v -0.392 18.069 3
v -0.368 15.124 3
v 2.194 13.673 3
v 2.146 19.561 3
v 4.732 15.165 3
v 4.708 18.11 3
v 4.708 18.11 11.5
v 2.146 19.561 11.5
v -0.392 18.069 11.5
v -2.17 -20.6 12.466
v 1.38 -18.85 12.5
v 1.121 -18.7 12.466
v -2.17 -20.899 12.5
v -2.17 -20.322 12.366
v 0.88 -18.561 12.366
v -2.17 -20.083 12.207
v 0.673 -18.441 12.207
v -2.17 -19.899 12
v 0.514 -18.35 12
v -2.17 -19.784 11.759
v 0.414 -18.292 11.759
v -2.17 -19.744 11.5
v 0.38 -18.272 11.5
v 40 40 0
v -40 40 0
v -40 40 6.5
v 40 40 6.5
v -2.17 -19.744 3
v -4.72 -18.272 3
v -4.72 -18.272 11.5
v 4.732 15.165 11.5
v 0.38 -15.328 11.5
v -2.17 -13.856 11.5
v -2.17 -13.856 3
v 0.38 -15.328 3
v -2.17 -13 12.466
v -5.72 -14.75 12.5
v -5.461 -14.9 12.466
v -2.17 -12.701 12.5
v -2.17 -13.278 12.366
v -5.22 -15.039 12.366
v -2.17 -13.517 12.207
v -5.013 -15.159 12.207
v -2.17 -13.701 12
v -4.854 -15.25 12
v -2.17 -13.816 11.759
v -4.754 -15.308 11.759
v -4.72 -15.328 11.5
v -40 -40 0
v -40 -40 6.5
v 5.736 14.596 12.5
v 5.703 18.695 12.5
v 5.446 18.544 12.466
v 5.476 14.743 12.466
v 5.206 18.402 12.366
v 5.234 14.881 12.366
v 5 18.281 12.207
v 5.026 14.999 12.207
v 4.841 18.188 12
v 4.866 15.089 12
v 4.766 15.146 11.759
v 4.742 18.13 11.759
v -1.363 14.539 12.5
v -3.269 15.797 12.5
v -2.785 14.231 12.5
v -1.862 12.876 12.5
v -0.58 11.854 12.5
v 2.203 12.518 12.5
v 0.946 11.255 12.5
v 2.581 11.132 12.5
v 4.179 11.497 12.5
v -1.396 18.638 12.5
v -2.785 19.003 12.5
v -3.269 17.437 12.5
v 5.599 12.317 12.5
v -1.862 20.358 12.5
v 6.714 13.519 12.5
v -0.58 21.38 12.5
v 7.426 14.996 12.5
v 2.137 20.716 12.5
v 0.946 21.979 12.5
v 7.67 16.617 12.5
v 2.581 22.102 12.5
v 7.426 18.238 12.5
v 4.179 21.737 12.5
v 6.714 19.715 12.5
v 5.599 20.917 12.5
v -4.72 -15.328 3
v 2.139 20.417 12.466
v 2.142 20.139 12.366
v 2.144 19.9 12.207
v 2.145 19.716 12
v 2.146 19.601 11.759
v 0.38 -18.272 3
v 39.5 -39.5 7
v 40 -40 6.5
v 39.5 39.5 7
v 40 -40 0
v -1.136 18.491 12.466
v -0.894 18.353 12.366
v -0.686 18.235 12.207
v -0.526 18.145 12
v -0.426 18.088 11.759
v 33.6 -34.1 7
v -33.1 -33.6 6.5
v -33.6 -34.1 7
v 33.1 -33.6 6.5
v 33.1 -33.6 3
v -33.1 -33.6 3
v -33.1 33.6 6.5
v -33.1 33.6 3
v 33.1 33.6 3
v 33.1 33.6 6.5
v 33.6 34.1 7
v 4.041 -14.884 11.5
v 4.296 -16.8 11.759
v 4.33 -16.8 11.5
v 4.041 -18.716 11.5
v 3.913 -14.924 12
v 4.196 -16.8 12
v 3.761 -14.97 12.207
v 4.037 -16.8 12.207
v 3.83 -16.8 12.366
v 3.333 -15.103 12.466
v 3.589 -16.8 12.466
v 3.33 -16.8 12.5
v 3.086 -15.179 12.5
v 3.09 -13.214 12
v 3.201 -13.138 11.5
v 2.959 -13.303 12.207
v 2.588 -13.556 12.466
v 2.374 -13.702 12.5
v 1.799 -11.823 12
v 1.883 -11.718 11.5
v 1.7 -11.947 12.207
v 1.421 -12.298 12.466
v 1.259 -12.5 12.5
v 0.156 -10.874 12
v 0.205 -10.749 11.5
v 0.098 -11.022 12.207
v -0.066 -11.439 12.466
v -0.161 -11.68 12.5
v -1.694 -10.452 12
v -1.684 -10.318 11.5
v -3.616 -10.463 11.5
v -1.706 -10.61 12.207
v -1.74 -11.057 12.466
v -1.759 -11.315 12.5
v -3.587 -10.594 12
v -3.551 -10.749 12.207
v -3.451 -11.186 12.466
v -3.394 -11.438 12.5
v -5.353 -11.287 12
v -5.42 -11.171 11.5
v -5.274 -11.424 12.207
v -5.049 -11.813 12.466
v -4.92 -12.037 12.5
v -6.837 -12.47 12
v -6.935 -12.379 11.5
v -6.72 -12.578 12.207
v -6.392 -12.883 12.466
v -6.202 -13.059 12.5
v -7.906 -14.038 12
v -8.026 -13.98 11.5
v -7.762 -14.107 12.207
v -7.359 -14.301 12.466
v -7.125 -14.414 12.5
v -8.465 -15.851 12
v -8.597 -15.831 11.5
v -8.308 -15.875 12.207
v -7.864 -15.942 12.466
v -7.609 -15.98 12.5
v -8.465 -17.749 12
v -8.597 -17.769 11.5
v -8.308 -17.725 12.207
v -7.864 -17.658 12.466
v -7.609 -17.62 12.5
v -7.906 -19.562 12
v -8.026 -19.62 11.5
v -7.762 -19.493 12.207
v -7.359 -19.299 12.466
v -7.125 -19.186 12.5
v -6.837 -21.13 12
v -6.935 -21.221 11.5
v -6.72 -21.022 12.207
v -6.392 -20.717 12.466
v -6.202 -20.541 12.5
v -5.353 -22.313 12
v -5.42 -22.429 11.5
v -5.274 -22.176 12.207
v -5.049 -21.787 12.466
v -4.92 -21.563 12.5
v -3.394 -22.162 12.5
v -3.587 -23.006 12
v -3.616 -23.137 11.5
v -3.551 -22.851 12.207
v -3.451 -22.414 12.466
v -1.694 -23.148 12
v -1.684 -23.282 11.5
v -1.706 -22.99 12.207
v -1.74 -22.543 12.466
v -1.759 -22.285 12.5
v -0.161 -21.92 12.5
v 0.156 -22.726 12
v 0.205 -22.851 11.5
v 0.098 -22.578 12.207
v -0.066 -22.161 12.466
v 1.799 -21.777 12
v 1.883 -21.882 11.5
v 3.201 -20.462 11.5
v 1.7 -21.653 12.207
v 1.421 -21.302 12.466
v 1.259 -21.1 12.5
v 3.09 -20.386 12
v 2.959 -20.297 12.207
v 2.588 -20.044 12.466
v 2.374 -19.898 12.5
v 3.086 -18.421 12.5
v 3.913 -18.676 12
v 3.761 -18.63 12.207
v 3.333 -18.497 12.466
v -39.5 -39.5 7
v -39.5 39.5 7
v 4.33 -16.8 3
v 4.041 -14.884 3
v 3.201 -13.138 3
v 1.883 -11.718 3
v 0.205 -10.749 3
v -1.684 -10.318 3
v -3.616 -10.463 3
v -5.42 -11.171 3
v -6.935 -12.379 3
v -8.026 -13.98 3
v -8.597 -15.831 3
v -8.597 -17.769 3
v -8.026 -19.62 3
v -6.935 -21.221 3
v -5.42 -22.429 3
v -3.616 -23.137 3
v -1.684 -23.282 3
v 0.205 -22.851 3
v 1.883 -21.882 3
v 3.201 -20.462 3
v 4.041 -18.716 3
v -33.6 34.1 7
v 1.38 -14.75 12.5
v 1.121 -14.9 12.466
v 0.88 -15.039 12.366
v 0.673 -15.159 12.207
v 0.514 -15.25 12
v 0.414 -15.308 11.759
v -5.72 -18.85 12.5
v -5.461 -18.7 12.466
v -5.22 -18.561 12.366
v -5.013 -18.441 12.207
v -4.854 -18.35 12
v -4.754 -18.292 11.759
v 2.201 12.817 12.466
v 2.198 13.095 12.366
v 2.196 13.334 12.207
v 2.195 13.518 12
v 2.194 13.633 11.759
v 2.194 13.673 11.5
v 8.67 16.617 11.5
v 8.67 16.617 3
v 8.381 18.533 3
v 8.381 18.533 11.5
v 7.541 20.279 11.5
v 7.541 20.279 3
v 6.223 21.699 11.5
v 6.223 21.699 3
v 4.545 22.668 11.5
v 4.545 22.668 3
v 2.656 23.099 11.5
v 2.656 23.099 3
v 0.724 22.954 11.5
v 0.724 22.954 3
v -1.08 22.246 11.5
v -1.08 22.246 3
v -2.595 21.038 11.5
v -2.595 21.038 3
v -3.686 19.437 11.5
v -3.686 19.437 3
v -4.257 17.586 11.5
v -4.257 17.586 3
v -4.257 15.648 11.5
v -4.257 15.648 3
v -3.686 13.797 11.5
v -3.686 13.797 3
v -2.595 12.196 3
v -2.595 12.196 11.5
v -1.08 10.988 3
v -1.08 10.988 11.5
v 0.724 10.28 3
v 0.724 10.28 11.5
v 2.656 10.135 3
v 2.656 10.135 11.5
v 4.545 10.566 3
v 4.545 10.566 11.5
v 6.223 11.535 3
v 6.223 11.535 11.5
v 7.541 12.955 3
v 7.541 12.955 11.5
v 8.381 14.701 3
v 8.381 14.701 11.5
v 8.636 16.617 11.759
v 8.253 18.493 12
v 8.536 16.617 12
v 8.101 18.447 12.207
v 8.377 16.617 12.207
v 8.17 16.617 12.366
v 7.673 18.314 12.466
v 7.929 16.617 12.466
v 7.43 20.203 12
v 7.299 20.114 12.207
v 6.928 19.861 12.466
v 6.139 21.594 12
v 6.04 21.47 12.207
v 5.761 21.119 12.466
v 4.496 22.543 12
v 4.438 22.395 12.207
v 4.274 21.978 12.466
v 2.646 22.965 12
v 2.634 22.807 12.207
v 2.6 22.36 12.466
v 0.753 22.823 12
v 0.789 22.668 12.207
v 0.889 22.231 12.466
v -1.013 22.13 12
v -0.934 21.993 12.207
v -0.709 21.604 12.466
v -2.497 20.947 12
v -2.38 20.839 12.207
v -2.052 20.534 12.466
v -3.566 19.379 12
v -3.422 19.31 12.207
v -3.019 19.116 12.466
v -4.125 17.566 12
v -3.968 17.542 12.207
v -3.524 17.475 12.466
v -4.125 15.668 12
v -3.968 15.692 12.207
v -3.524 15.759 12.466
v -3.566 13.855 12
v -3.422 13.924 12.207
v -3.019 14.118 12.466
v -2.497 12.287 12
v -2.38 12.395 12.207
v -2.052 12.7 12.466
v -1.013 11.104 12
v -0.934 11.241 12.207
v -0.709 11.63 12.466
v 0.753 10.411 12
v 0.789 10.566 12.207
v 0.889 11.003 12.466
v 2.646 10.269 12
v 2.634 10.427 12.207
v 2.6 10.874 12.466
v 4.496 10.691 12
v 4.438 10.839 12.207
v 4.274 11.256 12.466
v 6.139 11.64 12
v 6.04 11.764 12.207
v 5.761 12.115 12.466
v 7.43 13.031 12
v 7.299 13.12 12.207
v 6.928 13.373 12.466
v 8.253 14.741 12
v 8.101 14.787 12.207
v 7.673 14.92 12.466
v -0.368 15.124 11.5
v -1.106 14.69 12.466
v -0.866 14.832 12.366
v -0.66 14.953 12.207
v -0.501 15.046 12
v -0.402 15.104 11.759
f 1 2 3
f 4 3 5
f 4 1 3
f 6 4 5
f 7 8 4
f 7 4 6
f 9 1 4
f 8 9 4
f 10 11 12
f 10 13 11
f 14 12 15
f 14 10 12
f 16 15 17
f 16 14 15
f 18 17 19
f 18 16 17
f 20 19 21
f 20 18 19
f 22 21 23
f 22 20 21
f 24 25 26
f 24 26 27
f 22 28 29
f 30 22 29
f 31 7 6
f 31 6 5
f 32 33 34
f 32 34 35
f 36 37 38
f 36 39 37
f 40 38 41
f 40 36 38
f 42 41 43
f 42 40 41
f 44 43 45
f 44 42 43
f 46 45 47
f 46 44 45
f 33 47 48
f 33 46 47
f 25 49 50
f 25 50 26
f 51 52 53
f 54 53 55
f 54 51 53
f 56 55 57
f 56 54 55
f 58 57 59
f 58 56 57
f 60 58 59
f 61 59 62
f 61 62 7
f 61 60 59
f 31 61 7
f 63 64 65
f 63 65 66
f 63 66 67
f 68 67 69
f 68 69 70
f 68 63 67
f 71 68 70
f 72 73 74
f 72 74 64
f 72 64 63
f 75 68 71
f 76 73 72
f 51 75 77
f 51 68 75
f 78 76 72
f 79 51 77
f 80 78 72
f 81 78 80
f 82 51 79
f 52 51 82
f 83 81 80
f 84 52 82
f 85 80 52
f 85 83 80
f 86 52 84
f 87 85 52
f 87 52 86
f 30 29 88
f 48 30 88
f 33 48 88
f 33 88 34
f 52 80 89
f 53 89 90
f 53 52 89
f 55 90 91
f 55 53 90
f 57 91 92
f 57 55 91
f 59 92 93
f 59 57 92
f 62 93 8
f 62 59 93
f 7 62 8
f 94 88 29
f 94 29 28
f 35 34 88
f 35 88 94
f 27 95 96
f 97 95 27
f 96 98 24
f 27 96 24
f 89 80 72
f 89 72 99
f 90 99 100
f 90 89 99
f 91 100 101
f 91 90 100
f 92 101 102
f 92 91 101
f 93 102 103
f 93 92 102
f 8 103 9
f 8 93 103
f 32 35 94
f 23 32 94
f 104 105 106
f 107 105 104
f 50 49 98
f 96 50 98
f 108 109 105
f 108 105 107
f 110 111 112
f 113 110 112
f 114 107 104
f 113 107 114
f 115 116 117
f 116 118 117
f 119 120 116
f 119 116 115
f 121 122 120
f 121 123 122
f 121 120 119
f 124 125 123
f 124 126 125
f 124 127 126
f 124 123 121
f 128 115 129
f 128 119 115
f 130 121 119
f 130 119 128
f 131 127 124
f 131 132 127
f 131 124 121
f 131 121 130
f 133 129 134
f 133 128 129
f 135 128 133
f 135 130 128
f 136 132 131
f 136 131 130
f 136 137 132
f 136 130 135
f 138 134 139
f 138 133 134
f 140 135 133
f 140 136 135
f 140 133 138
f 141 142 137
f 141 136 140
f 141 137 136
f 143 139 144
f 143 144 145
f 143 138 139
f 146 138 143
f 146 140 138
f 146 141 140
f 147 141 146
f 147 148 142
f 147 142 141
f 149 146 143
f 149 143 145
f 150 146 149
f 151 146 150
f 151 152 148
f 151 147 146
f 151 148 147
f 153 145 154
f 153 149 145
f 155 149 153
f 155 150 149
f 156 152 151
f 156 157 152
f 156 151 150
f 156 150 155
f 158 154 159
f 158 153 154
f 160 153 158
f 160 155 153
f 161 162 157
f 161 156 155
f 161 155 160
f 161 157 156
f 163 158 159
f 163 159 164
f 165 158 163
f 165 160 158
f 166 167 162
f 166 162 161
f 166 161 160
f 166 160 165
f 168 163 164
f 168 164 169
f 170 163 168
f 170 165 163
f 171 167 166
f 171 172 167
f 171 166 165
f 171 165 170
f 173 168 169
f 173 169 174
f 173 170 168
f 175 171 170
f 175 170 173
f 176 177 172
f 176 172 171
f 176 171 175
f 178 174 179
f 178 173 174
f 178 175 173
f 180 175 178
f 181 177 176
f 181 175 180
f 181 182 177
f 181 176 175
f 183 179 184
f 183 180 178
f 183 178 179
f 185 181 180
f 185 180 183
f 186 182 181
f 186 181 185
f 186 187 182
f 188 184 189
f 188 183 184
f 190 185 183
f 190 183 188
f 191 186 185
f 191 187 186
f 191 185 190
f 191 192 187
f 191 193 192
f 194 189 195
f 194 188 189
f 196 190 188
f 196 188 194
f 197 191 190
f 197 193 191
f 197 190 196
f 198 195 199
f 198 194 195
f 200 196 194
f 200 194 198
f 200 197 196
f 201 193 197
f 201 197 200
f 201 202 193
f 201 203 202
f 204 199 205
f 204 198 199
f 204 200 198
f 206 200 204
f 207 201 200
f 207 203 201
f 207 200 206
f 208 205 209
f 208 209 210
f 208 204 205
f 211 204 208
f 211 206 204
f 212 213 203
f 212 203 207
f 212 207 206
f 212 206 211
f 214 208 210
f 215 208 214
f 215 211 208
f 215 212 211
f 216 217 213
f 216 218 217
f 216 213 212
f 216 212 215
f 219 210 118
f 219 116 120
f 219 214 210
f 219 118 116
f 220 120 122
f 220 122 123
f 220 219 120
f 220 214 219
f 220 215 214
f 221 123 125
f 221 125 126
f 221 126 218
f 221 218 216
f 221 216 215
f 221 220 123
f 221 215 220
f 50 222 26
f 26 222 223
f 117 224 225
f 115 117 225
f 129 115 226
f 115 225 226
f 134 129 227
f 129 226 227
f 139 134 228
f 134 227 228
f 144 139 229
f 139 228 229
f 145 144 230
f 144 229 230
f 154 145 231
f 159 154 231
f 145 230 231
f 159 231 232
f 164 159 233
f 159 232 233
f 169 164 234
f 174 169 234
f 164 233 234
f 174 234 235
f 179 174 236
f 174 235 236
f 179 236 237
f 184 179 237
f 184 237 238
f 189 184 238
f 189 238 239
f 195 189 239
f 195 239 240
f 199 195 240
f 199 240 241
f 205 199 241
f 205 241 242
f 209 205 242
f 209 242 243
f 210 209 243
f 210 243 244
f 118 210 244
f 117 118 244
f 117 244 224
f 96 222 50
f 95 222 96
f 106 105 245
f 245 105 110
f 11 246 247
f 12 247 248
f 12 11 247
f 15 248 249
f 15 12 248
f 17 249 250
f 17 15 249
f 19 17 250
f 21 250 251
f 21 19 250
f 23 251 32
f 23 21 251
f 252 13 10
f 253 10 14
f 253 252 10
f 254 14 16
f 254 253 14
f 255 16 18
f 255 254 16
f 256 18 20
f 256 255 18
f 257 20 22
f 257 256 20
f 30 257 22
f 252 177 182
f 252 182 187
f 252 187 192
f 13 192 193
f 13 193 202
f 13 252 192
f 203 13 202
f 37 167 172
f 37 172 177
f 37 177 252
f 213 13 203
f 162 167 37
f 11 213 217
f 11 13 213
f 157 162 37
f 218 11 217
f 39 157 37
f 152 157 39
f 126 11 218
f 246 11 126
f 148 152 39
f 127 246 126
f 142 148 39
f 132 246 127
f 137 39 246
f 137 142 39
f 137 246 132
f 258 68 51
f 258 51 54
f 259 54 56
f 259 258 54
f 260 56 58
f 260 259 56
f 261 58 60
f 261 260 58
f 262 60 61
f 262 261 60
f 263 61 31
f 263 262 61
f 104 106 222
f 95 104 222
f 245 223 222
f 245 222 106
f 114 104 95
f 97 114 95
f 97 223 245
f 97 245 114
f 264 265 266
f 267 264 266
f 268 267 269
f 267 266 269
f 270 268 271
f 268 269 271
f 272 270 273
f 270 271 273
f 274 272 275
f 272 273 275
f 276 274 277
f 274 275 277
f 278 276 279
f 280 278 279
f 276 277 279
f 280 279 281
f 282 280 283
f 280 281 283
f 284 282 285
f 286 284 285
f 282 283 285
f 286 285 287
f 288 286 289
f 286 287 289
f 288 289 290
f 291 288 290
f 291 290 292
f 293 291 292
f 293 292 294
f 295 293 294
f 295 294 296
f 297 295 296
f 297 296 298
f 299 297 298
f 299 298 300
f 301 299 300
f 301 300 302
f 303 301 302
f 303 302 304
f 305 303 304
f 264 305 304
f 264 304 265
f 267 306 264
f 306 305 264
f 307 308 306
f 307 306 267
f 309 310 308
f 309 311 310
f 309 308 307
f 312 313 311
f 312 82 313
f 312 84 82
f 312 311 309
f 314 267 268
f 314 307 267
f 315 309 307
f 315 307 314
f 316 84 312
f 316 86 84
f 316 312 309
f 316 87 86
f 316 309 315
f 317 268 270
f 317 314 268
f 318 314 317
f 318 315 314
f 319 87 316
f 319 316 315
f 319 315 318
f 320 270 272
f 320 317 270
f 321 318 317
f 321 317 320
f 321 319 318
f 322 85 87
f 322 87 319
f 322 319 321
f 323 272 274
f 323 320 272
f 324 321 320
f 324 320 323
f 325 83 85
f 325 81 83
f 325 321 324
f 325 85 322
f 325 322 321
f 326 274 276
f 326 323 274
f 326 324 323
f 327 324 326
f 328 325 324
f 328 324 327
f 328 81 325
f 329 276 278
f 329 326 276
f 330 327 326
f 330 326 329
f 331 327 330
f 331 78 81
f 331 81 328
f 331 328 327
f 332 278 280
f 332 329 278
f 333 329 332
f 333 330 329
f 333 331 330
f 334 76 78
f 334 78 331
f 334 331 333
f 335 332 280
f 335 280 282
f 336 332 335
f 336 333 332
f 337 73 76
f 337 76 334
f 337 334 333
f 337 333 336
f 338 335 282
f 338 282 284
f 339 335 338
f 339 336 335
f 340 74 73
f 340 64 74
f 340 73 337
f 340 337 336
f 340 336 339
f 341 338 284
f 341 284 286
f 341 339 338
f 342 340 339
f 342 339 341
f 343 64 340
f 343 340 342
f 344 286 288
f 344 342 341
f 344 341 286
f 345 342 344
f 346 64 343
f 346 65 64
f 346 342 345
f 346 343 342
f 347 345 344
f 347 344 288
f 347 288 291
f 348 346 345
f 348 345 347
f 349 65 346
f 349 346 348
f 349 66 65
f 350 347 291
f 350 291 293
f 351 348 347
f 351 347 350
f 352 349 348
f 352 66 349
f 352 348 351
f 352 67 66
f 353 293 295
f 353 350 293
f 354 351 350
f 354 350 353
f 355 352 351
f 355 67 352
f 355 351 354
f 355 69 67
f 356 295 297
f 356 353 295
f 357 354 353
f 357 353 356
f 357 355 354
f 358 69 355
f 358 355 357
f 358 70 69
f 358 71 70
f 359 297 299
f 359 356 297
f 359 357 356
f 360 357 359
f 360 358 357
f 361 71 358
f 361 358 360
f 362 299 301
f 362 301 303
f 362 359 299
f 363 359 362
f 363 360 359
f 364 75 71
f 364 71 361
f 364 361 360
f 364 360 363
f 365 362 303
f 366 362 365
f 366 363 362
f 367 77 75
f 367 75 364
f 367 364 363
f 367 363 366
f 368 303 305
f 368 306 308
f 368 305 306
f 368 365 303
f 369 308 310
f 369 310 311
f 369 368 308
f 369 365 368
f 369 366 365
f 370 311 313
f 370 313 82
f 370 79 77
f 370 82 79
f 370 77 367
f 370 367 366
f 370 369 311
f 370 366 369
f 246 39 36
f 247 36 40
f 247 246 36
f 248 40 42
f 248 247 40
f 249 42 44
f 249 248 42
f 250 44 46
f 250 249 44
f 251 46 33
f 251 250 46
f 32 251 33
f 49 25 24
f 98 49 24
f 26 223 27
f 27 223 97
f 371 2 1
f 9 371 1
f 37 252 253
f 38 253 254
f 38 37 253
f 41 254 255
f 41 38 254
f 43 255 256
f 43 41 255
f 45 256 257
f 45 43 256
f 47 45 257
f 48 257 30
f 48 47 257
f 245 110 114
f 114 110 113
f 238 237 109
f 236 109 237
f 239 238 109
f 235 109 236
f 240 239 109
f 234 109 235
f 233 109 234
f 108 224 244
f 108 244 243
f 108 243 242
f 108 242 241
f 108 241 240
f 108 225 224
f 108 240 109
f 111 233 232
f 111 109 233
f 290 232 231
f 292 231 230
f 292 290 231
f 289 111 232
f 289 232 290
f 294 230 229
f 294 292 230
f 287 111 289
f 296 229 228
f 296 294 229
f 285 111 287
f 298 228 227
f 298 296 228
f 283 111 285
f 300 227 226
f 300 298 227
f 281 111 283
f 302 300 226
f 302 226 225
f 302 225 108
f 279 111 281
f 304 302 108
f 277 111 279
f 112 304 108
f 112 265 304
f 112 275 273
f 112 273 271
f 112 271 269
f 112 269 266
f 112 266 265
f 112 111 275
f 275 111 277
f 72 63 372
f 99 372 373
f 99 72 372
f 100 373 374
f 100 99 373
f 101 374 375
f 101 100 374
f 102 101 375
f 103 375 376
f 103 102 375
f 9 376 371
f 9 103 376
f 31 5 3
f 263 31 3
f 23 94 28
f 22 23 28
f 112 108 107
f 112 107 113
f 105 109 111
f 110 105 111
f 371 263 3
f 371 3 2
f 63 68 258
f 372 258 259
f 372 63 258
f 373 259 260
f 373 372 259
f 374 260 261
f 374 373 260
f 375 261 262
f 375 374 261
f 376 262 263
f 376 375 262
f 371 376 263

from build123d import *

# Parameters (mm, degrees)
F0_W     = 80
F0_H     = 80
F0_R     = 6.5
F1_DEPTH = 3
F2_DEPTH = 12.5
F3_R     = 1
F4_W     = 80
F4_H     = 80
F4_W_2   = 66.2
F4_H_2   = 67.2
F5_DEPTH = 4
F6_SIZE  = 0.5


# Not quite as in the source:
# - a feature names something its author has since deleted; it is built from what else it names


with BuildPart() as f1:
    # F0 (on Top) → F1 (new body)
    with BuildSketch(Plane.XY):
        Rectangle(F0_W, F0_H)
        with Locations((-2.17, -16.8)):
            Circle(F0_R, mode=Mode.SUBTRACT)
        with Locations((2.17, 16.617)):
            Circle(F0_R, mode=Mode.SUBTRACT)
        with Locations((2.17, 16.617)):
            Circle(F0_R)
        Polygon((-0.3917684664, 18.0686688068), (2.1462978314, 19.5613909739), (4.7080662978, 18.1097221671), (4.7317684664, 15.1653311932), (2.1937021686, 13.6726090261), (-0.3680662978, 15.1242778329), align=None, mode=Mode.SUBTRACT)
        Polygon((4.7080662978, 18.1097221671), (2.1462978314, 19.5613909739), (-0.3917684664, 18.0686688068), (-0.3680662978, 15.1242778329), (2.1937021686, 13.6726090261), (4.7317684664, 15.1653311932), align=None)
        with Locations((-2.17, -16.8)):
            Circle(F0_R)
        Polygon((-2.17, -13.8555136271), (0.38, -15.3277568136), (0.38, -18.2722431864), (-2.17, -19.7444863729), (-4.72, -18.2722431864), (-4.72, -15.3277568136), align=None, mode=Mode.SUBTRACT)
        Polygon((0.38, -18.2722431864), (0.38, -15.3277568136), (-2.17, -13.8555136271), (-4.72, -15.3277568136), (-4.72, -18.2722431864), (-2.17, -19.7444863729), align=None)
    extrude(amount=F1_DEPTH)

    # F0 (on Top) → F2 (join)
    with BuildSketch(Plane.XY):
        with Locations((2.17, 16.617)):
            Circle(F0_R)
        Polygon((-0.3917684664, 18.0686688068), (2.1462978314, 19.5613909739), (4.7080662978, 18.1097221671), (4.7317684664, 15.1653311932), (2.1937021686, 13.6726090261), (-0.3680662978, 15.1242778329), align=None, mode=Mode.SUBTRACT)
        with Locations((-2.17, -16.8)):
            Circle(F0_R)
        Polygon((-2.17, -13.8555136271), (0.38, -15.3277568136), (0.38, -18.2722431864), (-2.17, -19.7444863729), (-4.72, -18.2722431864), (-4.72, -15.3277568136), align=None, mode=Mode.SUBTRACT)
    extrude(amount=F2_DEPTH)

    # F3
    f3_edges = [f1.edges().sort_by_distance(p)[0] for p in [
        (-4.33, 16.617, 12.5),
        (0.877265, 18.81503, 12.5),
        (3.427182, 18.835557, 12.5),
        (4.719917, 16.637527, 12.5),
        (3.462735, 14.41897, 12.5),
        (0.912818, 14.398443, 12.5),
        (-0.379917, 16.596473, 12.5),
        (-8.67, -16.8, 12.5),
        (-0.895, -14.591635, 12.5),
        (0.38, -16.8, 12.5),
        (-0.895, -19.008365, 12.5),
        (-3.445, -19.008365, 12.5),
        (-4.72, -16.8, 12.5),
        (-3.445, -14.591635, 12.5),
    ]]
    fillet(f3_edges, radius=F3_R)

    # F4 (on face) → F5 (join)
    with BuildSketch(Plane.XY.offset(3)):
        Rectangle(F4_W, F4_H)
        Rectangle(F4_W_2, F4_H_2, mode=Mode.SUBTRACT)
    extrude(amount=F5_DEPTH)

    # F6
    f6_edges = [f1.edges().sort_by_distance(p)[0] for p in [
        (0, -40, 7),
        (40, 0, 7),
        (0, 40, 7),
        (-40, 0, 7),
        (0, 33.6, 7),
        (33.1, 0, 7),
        (0, -33.6, 7),
        (-33.1, 0, 7),
    ]]
    chamfer(f6_edges, length=F6_SIZE)


solid = f1.part
